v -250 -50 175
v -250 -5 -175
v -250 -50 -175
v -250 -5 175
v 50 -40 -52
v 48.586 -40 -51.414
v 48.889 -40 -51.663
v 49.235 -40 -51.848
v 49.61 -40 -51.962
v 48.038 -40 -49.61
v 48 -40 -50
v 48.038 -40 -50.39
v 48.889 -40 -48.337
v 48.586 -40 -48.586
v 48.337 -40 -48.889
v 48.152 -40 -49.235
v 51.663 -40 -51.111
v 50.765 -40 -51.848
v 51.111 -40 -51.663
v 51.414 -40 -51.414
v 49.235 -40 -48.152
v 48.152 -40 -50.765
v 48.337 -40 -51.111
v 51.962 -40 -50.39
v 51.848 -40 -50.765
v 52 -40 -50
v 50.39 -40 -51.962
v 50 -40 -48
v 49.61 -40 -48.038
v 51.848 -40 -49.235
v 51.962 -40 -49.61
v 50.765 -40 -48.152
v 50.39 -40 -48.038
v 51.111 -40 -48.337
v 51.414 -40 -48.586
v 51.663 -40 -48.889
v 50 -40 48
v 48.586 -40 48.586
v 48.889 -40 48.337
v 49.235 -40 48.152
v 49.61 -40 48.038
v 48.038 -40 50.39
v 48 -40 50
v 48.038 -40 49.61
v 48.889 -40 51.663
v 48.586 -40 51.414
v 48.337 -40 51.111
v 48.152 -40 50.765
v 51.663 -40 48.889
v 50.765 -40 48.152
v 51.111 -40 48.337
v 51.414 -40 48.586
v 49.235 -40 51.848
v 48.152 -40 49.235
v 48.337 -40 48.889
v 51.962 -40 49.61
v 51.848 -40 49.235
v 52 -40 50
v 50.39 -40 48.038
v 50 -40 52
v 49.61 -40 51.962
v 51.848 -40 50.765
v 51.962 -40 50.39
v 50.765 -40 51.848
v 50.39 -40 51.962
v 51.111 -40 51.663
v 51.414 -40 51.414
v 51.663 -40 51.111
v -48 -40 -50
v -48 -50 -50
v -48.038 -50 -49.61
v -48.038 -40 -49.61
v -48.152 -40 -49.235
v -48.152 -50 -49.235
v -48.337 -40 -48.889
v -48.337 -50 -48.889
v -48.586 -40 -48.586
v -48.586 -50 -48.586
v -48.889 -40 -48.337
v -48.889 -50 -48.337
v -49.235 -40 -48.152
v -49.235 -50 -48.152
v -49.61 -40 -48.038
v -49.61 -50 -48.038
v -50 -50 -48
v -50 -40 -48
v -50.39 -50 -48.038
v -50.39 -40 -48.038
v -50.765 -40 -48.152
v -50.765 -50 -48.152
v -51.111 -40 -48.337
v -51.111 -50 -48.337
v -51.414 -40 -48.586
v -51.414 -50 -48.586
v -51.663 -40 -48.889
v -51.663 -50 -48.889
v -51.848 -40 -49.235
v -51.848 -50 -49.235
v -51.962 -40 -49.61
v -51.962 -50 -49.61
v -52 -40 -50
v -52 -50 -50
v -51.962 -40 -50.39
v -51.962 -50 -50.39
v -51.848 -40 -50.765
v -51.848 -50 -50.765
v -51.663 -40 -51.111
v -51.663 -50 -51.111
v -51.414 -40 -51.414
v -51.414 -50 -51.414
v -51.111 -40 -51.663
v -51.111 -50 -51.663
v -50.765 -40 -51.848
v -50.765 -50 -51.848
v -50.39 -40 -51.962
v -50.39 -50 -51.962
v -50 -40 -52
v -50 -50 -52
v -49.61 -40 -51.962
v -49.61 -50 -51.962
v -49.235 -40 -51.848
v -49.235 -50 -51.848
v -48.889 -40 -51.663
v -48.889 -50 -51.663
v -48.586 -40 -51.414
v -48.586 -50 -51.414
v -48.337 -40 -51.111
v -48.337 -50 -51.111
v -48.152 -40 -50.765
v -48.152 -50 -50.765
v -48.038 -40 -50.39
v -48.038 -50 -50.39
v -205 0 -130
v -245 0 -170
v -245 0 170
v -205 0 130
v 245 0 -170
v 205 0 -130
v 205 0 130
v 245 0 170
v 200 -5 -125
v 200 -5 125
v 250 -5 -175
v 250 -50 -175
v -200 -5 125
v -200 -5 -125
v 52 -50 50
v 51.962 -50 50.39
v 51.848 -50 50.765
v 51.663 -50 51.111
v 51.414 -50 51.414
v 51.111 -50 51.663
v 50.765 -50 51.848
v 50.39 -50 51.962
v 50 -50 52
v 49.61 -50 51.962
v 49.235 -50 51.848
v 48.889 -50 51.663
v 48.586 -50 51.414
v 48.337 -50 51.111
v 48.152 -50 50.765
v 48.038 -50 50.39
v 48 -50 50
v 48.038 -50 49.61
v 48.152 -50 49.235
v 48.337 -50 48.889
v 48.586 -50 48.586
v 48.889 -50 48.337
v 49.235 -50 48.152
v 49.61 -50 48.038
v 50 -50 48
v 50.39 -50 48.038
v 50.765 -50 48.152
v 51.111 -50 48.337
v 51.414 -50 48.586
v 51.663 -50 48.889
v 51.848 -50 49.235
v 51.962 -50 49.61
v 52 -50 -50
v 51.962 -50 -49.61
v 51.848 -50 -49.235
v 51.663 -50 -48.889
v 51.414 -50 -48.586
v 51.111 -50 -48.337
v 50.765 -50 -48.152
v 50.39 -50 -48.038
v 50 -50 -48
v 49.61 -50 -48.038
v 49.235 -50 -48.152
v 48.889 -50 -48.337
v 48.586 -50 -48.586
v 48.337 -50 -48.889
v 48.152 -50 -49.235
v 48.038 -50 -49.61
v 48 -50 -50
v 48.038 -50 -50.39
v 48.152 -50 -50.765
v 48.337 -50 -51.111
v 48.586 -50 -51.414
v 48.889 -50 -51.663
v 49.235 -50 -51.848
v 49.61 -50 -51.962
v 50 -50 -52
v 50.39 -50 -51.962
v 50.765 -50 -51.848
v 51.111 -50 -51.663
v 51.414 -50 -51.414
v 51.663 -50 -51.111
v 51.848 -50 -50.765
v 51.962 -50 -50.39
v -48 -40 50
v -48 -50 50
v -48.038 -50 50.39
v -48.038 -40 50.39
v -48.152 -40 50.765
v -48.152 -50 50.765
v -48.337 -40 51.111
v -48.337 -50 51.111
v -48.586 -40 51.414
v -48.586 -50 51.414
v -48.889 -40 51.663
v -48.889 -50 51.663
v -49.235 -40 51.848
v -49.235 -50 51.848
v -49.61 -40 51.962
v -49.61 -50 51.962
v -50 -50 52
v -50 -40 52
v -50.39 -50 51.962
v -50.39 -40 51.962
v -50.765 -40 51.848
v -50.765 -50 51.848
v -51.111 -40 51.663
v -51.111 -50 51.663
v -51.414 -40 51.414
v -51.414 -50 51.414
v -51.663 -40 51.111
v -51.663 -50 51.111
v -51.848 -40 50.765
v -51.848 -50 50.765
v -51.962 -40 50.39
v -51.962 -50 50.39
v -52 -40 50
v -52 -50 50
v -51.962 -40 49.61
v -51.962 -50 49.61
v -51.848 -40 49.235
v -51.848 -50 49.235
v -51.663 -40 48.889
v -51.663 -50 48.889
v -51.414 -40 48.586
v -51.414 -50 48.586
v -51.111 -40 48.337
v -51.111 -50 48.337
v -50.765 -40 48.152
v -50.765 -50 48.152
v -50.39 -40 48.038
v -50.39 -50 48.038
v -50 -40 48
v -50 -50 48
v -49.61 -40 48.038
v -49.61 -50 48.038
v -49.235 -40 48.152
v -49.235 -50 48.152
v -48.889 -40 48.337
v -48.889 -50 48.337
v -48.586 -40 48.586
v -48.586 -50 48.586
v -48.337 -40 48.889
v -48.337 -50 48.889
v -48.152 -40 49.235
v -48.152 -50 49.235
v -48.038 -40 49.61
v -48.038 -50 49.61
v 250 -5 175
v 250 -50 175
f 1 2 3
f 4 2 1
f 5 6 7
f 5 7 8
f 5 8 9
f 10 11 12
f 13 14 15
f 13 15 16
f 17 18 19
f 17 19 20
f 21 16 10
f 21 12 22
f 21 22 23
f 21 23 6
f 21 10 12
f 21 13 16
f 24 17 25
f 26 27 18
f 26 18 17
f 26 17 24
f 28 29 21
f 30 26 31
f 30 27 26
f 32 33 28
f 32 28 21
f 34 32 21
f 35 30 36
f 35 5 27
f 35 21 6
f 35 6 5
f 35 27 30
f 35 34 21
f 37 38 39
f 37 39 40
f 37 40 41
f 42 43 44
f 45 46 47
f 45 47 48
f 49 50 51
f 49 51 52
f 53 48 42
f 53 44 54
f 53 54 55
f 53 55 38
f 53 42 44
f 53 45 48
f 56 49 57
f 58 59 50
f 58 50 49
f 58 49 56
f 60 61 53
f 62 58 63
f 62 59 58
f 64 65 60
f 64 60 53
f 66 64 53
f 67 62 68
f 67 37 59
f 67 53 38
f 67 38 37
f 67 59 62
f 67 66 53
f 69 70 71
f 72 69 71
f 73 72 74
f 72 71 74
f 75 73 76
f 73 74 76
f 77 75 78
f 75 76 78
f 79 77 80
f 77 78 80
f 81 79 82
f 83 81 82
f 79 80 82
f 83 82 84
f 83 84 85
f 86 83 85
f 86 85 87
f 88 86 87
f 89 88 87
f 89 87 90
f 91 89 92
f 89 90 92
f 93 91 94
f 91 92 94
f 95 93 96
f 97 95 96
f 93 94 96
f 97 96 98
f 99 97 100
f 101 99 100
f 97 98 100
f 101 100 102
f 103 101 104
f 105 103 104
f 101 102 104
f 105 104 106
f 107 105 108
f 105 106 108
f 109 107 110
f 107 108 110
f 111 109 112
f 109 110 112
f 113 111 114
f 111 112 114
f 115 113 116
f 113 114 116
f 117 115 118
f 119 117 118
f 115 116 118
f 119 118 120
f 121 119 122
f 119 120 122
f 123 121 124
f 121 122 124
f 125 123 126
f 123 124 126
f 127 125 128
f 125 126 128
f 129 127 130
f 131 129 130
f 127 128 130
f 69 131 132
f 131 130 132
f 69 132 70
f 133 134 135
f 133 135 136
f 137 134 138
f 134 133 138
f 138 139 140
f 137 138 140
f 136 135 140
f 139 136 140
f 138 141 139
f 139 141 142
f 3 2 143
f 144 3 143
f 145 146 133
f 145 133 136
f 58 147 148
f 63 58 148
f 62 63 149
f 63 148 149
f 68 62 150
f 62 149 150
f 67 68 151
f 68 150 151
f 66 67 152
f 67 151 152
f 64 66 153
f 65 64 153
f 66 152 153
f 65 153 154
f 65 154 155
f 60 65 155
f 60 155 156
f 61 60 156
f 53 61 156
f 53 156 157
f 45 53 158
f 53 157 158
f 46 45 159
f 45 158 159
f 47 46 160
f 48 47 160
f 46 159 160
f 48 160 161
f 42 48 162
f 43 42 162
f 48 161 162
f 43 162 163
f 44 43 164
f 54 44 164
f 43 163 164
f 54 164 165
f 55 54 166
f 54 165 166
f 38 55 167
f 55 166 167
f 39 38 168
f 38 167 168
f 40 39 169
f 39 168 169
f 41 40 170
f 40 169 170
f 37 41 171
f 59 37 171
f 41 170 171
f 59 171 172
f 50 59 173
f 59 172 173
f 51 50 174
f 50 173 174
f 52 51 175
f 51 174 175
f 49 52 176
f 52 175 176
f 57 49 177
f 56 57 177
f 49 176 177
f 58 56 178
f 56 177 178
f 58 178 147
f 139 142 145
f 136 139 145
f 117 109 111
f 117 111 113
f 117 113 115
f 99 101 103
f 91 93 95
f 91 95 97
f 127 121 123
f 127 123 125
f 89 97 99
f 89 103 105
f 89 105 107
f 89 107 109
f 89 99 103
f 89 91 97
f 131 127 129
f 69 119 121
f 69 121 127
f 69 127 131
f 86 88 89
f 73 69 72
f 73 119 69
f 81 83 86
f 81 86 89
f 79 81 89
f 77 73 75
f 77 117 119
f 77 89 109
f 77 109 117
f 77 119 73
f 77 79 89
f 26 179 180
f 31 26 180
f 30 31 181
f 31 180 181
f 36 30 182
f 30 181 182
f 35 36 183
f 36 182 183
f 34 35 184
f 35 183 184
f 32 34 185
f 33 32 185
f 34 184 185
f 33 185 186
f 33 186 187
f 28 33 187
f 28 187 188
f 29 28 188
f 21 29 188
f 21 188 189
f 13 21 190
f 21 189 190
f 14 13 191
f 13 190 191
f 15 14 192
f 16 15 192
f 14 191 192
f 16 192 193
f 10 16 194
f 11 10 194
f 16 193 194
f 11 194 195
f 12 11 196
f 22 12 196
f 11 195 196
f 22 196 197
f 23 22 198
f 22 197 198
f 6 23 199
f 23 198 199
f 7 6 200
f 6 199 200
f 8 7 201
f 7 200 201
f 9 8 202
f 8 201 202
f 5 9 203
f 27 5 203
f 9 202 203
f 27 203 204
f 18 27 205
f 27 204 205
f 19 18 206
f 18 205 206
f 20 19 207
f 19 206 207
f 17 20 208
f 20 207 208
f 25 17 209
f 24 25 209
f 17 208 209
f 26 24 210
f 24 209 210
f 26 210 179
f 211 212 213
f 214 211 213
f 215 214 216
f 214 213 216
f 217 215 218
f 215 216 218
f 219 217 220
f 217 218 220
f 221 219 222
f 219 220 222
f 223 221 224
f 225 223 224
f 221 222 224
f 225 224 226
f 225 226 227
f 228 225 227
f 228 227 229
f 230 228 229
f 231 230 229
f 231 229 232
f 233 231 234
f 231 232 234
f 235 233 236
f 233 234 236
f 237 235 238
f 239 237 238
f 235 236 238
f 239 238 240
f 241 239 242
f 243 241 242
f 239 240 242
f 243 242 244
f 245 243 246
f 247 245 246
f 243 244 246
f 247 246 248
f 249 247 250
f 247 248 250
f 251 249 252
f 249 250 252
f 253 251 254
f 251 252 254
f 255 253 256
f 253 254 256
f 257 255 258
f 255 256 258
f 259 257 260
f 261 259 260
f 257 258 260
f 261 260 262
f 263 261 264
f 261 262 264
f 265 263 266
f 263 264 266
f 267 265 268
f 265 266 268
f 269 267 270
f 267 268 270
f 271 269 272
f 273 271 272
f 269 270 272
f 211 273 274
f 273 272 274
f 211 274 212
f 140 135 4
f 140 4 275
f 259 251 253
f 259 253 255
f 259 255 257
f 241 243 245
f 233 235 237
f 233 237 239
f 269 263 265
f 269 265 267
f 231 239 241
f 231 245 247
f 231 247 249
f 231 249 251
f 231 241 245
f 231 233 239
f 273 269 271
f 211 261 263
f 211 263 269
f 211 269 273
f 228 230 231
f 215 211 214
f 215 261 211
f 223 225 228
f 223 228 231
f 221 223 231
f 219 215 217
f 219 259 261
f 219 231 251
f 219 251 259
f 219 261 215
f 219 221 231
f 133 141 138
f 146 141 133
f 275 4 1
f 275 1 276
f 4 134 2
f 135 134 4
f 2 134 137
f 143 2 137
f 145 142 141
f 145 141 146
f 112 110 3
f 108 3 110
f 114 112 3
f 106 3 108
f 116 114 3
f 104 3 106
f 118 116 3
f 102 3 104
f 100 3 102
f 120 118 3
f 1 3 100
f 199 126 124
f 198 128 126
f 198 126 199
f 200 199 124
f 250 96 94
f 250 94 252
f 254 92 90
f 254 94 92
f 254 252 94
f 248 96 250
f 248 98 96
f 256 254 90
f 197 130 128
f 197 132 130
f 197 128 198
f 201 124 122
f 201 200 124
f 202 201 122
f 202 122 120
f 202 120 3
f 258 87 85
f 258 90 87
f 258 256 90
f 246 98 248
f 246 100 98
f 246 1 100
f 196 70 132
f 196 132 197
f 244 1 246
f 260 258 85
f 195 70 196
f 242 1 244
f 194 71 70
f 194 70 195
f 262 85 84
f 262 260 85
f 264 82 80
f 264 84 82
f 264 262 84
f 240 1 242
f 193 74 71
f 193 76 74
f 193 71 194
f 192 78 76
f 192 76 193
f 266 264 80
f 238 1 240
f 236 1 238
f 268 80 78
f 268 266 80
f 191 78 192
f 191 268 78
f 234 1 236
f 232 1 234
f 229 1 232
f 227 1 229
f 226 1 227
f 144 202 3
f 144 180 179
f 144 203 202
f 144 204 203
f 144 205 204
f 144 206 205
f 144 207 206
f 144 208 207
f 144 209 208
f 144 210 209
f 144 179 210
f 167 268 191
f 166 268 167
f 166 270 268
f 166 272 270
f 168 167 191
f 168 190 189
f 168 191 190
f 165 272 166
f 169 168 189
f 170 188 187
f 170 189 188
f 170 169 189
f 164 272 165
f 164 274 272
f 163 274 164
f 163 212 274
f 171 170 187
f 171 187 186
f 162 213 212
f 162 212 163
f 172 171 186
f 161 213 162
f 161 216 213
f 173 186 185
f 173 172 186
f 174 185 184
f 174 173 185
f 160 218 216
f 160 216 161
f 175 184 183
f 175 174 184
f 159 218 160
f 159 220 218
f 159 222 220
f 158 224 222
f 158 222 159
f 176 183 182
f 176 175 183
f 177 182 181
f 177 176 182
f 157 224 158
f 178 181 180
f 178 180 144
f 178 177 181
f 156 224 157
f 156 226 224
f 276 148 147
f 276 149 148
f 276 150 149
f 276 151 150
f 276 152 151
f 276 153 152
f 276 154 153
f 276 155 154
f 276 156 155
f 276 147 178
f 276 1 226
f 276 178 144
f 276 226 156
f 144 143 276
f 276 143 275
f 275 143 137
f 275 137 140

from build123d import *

# Parameters (mm, degrees)
F0_W     = 500
F0_H     = 350
F1_DEPTH = 50
F2_R     = 2
F3_DEPTH = 10
F4_W     = 400
F4_H     = 250
F5_DEPTH = 5
F6_SIZE  = 4.99999


# Not quite as in the source:
# - a fillet or chamfer is up to 0.001 mm smaller than in the source, because OpenCascade refuses the exact size


with BuildPart() as f1:
    # F0 (on Front) → F1 (new body)
    with BuildSketch(Plane.XZ):
        Rectangle(F0_W, F0_H)
    extrude(amount=F1_DEPTH)

    # F2 (on face) → F3 (cut)
    with BuildSketch(Plane.XZ.offset(50)):
        with Locations((-50, 50)):
            Circle(F2_R)
        with Locations((50, 50)):
            Circle(F2_R)
        with Locations((50, -50)):
            Circle(F2_R)
        with Locations((-50, -50)):
            Circle(F2_R)
    extrude(amount=-F3_DEPTH, mode=Mode.SUBTRACT)

    # F4 (on face) → F5 (cut)
    with BuildSketch(Plane(origin=(0, 0, 0), x_dir=(-1, 0, 0), z_dir=(0, 1, 0))):
        Rectangle(F4_W, F4_H)
    extrude(amount=-F5_DEPTH, mode=Mode.SUBTRACT)

    # F6 (size 5 in the source; OpenCascade refuses exactly that, so slightly less here)
    f6_edges = [f1.edges().sort_by_distance(p)[0] for p in [
        (250, 0, 0),
        (0, 0, -175),
        (0, 0, 175),
        (-250, 0, 0),
        (-200, 0, 0),
        (0, 0, -125),
        (200, 0, 0),
        (0, 0, 125),
    ]]
    chamfer(f6_edges, length=F6_SIZE)


solid = f1.part
